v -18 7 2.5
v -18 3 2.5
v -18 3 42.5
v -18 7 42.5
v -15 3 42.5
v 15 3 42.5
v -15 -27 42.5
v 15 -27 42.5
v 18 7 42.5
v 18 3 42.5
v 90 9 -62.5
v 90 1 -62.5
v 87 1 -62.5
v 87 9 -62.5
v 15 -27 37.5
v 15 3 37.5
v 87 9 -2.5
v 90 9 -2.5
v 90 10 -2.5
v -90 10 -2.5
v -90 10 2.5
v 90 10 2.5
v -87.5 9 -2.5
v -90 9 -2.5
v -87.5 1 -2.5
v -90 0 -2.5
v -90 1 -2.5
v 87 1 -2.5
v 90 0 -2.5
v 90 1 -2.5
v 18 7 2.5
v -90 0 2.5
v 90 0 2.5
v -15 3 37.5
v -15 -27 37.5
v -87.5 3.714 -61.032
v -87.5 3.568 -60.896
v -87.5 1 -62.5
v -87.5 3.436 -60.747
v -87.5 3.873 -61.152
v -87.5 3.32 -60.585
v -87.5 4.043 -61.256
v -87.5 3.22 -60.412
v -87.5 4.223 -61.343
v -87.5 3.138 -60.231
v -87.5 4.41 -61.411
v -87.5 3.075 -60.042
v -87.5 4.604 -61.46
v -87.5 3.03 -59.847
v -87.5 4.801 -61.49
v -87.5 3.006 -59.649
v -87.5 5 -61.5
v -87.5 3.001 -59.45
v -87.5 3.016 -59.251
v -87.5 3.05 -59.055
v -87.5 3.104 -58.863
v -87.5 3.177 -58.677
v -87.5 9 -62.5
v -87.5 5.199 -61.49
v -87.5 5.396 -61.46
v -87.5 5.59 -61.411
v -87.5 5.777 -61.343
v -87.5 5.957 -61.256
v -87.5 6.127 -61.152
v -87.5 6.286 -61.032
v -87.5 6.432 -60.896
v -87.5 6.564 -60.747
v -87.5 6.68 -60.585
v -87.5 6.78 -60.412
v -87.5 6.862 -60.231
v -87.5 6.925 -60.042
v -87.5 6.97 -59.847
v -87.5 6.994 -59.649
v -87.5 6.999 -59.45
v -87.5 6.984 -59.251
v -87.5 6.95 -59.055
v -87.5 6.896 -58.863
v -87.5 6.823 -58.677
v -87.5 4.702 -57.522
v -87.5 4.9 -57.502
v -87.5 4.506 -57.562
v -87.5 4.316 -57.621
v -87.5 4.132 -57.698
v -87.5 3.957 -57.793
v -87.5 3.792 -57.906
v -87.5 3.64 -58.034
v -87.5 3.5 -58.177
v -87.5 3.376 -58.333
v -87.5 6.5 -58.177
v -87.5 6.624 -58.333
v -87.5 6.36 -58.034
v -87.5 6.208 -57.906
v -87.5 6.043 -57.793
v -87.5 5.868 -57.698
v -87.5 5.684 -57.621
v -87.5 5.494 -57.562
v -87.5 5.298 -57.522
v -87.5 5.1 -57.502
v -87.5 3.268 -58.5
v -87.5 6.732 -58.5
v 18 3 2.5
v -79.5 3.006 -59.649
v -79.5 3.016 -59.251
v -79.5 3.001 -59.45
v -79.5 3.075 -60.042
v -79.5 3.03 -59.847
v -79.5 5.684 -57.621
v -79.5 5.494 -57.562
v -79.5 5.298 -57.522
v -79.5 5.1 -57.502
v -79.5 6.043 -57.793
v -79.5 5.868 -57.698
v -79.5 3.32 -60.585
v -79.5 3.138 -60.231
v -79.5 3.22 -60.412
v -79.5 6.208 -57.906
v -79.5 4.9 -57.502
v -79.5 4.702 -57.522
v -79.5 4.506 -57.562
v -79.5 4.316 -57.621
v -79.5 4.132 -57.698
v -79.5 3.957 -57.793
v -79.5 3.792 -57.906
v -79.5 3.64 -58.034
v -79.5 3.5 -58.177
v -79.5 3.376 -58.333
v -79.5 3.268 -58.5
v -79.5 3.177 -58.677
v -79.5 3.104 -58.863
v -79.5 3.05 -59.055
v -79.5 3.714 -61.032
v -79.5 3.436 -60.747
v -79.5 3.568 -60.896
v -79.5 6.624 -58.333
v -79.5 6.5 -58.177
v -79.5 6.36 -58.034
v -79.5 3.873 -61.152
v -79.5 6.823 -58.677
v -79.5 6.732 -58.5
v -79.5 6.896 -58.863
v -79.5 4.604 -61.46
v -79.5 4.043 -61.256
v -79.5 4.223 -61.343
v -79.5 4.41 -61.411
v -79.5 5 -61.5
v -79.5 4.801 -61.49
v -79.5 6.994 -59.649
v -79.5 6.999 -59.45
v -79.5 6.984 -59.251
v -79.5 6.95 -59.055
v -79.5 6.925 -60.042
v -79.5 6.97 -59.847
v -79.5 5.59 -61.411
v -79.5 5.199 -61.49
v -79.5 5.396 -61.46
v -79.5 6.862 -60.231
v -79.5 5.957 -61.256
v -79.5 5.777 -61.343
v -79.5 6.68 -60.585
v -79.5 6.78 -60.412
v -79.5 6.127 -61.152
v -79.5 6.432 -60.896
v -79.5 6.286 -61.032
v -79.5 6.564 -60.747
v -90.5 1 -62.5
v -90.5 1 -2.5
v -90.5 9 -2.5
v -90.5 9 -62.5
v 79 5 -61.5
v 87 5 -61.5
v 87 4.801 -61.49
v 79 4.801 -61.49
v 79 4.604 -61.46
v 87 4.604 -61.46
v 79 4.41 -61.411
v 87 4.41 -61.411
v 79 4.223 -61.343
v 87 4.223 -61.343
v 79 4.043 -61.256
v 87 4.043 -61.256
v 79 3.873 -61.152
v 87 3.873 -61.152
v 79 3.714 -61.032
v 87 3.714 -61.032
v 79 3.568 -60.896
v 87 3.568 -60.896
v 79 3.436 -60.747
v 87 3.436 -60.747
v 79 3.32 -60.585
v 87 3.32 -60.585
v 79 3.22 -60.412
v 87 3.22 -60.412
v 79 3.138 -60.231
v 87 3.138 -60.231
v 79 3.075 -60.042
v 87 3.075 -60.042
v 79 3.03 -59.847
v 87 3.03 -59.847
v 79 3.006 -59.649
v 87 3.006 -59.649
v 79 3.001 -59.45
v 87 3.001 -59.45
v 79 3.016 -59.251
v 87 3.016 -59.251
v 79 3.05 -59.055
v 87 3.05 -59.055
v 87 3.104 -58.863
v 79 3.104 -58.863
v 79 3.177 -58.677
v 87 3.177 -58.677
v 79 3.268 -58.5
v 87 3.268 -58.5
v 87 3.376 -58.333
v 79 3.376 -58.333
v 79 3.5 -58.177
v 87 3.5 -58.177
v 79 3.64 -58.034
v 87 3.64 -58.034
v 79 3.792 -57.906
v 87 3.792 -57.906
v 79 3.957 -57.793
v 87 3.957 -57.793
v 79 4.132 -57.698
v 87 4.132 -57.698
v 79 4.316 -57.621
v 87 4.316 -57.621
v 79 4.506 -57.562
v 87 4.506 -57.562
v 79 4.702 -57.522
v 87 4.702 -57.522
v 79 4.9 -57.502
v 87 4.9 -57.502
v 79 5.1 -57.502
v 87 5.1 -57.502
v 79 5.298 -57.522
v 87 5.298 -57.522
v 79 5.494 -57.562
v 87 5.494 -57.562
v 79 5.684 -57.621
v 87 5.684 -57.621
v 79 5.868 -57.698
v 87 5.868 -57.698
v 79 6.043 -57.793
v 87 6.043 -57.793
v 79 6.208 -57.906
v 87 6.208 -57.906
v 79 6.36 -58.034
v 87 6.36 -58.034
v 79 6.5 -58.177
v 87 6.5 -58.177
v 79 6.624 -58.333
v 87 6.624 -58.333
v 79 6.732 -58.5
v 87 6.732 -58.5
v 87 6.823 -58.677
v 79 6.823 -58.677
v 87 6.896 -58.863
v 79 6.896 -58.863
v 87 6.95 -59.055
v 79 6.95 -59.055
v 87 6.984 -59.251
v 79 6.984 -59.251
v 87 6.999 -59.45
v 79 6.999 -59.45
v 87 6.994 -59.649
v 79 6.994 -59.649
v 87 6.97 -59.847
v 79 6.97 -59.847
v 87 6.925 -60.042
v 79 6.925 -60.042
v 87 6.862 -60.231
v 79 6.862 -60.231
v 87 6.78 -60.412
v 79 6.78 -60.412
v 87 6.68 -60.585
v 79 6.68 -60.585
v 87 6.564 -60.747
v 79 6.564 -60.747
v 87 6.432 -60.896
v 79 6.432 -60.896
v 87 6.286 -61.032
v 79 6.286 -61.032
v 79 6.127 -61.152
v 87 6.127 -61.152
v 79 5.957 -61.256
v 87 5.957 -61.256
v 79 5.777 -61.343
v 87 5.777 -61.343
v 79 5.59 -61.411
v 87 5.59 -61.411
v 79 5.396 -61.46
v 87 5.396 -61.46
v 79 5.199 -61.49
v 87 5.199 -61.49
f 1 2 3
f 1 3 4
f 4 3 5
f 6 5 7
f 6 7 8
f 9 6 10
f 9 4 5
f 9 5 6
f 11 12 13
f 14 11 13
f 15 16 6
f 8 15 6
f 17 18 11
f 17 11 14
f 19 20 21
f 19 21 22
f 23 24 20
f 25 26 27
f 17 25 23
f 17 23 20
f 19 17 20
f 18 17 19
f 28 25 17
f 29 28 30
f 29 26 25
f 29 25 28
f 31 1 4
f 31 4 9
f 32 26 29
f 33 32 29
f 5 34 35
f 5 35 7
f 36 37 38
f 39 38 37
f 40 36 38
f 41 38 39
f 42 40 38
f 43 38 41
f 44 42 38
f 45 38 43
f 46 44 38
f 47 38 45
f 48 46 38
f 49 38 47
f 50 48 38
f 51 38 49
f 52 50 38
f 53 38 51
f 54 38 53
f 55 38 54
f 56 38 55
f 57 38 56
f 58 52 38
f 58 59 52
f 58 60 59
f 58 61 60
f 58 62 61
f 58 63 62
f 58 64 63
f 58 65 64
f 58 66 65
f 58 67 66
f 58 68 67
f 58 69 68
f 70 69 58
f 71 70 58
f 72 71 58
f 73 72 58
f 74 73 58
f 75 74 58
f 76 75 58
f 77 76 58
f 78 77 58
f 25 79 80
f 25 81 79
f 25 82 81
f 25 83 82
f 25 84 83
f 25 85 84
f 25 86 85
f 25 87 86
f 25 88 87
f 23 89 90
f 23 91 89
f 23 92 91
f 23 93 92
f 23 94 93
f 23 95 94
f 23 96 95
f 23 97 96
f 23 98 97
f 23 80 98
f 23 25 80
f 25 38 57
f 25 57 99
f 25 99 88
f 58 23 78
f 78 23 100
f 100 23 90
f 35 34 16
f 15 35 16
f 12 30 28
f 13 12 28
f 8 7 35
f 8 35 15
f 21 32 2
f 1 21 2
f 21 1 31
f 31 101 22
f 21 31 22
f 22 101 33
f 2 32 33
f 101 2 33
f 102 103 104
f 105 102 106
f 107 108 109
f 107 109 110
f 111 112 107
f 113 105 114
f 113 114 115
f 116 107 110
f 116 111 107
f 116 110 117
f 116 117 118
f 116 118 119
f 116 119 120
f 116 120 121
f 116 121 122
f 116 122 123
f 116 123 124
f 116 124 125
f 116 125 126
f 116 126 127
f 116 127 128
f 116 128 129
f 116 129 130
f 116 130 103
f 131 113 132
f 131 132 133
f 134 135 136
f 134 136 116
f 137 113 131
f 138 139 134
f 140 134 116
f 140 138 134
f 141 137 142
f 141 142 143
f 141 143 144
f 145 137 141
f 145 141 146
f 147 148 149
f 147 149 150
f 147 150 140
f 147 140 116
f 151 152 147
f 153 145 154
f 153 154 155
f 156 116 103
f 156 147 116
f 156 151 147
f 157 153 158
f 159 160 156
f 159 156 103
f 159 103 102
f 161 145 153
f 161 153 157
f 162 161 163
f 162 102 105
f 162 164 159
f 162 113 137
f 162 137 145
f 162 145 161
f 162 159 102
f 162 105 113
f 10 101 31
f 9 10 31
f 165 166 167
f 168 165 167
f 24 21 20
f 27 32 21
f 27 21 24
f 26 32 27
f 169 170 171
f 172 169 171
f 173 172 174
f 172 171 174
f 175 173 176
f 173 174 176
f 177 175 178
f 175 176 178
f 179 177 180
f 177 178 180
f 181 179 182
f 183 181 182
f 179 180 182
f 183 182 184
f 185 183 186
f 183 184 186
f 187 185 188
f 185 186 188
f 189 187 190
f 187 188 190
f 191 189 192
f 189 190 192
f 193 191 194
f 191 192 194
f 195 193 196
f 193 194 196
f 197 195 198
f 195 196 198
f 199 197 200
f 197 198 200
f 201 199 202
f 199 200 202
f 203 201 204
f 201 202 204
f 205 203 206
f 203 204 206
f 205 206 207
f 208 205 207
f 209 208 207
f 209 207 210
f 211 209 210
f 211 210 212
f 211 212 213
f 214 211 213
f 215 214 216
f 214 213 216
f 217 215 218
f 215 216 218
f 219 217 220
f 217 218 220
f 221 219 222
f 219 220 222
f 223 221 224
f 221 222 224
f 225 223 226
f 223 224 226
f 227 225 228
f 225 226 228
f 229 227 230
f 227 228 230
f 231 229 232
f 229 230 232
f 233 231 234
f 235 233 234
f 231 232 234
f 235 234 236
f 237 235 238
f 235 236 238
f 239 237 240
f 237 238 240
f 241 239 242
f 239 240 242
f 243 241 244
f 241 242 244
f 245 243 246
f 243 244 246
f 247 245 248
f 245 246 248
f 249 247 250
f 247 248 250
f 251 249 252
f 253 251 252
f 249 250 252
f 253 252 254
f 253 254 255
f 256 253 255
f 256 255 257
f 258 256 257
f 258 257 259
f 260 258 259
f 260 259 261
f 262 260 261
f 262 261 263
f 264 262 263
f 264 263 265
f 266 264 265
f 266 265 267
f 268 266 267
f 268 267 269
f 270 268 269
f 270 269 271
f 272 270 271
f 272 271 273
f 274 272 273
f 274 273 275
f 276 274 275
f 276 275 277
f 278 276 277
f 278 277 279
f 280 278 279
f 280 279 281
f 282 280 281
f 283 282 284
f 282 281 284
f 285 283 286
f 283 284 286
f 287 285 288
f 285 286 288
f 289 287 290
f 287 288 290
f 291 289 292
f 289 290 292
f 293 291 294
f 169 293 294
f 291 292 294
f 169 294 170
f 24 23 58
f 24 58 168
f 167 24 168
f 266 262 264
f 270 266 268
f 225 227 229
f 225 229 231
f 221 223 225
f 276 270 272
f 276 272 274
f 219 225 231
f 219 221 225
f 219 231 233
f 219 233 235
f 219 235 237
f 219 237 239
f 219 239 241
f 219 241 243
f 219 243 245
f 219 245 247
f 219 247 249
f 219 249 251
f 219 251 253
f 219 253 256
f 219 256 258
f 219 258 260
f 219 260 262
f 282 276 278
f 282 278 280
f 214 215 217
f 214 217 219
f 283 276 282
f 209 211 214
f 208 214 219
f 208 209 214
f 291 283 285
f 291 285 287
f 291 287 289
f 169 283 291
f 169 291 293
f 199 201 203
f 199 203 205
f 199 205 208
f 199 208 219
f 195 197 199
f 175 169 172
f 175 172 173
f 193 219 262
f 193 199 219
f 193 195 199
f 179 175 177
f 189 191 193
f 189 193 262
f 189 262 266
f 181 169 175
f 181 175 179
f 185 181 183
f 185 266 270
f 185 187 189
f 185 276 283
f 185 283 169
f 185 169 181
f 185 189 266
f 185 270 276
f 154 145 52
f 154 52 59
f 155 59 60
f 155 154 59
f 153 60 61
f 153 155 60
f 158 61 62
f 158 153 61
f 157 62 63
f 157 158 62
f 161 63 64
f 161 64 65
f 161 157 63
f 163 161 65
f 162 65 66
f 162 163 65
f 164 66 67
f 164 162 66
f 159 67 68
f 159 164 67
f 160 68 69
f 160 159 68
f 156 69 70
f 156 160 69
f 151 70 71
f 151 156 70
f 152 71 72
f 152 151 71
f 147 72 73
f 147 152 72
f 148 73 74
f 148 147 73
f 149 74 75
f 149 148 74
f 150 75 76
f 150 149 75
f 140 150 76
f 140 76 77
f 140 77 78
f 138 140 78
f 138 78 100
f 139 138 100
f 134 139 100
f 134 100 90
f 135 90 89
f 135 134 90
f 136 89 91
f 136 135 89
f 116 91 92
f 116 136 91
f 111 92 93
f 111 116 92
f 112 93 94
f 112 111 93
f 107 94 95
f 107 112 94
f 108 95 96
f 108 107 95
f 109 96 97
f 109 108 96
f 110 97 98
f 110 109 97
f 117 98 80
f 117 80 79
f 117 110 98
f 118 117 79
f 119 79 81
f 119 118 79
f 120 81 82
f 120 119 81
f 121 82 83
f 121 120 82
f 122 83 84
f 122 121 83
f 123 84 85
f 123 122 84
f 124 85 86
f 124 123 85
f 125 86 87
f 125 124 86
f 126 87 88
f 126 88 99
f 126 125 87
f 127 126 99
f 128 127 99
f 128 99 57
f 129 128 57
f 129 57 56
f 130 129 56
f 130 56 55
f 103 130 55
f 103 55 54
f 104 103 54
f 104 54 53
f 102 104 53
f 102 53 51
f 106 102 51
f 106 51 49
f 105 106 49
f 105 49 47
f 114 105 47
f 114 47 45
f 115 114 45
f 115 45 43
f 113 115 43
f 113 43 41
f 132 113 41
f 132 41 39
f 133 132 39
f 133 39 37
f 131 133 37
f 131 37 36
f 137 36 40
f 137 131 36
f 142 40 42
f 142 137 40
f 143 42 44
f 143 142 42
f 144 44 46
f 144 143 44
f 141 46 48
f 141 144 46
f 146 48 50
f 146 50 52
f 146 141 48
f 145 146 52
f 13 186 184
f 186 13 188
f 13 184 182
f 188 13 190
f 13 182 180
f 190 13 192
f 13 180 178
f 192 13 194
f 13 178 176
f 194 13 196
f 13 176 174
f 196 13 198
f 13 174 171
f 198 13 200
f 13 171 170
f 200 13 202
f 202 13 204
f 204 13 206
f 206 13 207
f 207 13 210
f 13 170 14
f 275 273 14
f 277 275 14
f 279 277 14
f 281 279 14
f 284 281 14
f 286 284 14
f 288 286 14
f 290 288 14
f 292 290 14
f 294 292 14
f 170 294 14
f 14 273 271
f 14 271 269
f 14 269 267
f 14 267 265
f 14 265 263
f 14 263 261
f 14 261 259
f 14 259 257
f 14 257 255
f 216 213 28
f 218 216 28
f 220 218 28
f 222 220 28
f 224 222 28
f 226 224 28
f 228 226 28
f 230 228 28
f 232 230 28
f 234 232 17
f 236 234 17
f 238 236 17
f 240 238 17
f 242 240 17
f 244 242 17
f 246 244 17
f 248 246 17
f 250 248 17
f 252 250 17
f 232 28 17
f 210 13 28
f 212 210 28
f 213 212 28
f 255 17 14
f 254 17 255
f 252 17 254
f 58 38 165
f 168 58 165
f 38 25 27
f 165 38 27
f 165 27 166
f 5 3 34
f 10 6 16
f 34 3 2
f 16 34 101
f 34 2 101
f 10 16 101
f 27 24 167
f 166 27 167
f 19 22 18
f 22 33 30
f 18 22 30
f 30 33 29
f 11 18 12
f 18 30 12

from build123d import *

# Parameters (mm, degrees)
SKETCH_1_W             = 180
SKETCH_1_H             = 5
EXTRUDE_1_DEPTH        = 10
SKETCH_2_W             = 3
SKETCH_2_H             = 8
EXTRUDE_2_DEPTH        = 60
SKETCH_5_R             = 2
EXTRUDE_4_DEPTH        = 8
SKETCH_6_W             = 36
SKETCH_6_H             = 4
EXTRUDE_5_DEPTH        = 40
SKETCH_7_W             = 30
SKETCH_7_H             = 5
EXTRUDE_6_DEPTH        = 30
PATTERN_LINEAR_1_COUNT = 2
PATTERN_LINEAR_1_PITCH = 177.5
EXTRUDE_START          = 8
SKETCH_8_R             = 2
EXTRUDE_7_DEPTH        = 8


with BuildPart() as part:
    # 草图1 → 凸台-拉伸1 (new body)
    with BuildSketch(Plane(origin=(0, 0, 0), x_dir=(1, 0, 0), z_dir=(0, 1, 0))):
        Rectangle(SKETCH_1_W, SKETCH_1_H)
    extrude(amount=EXTRUDE_1_DEPTH)

    # 草图2 → 凸台-拉伸2 (add)
    with BuildSketch(Plane(origin=(0, 0, -2.5), x_dir=(-1, 0, 0), z_dir=(0, 0, -1))):
        with Locations((-88.5, 5)):
            Rectangle(SKETCH_2_W, SKETCH_2_H)
    extrude_2 = extrude(amount=EXTRUDE_2_DEPTH)

    # 草图5 → 凸台-拉伸4 (add)
    with BuildSketch(Plane.ZY.offset(-87)):
        with Locations(Location((-59.5, 5, 0), (0, 0, 180))):
            Circle(SKETCH_5_R)
    extrude(amount=EXTRUDE_4_DEPTH)

    # 草图6 → 凸台-拉伸5 (add)
    with BuildSketch(Plane.XY.offset(2.5)):
        with Locations((0, 5)):
            Rectangle(SKETCH_6_W, SKETCH_6_H)
    extrude(amount=EXTRUDE_5_DEPTH)

    # 草图7 → 凸台-拉伸6 (add)
    with BuildSketch(Plane.XZ.offset(-3)):
        with Locations((0, 40)):
            Rectangle(SKETCH_7_W, SKETCH_7_H)
    extrude(amount=EXTRUDE_6_DEPTH)

    # 阵列(线性)1: 凸台-拉伸2 ×2
    with Locations(*[(-i * PATTERN_LINEAR_1_PITCH, 0, 0) for i in range(1, PATTERN_LINEAR_1_COUNT)]):
        add(extrude_2)

    # 草图8 → 凸台-拉伸7 (add)
    with BuildSketch(Plane(origin=(-87.5, 0, 0), x_dir=(0, 0, -1), z_dir=(1, 0, 0)).offset(EXTRUDE_START)):
        with Locations((59.5, 5)):
            Circle(SKETCH_8_R)
    extrude(amount=-EXTRUDE_7_DEPTH)


solid = part.part
